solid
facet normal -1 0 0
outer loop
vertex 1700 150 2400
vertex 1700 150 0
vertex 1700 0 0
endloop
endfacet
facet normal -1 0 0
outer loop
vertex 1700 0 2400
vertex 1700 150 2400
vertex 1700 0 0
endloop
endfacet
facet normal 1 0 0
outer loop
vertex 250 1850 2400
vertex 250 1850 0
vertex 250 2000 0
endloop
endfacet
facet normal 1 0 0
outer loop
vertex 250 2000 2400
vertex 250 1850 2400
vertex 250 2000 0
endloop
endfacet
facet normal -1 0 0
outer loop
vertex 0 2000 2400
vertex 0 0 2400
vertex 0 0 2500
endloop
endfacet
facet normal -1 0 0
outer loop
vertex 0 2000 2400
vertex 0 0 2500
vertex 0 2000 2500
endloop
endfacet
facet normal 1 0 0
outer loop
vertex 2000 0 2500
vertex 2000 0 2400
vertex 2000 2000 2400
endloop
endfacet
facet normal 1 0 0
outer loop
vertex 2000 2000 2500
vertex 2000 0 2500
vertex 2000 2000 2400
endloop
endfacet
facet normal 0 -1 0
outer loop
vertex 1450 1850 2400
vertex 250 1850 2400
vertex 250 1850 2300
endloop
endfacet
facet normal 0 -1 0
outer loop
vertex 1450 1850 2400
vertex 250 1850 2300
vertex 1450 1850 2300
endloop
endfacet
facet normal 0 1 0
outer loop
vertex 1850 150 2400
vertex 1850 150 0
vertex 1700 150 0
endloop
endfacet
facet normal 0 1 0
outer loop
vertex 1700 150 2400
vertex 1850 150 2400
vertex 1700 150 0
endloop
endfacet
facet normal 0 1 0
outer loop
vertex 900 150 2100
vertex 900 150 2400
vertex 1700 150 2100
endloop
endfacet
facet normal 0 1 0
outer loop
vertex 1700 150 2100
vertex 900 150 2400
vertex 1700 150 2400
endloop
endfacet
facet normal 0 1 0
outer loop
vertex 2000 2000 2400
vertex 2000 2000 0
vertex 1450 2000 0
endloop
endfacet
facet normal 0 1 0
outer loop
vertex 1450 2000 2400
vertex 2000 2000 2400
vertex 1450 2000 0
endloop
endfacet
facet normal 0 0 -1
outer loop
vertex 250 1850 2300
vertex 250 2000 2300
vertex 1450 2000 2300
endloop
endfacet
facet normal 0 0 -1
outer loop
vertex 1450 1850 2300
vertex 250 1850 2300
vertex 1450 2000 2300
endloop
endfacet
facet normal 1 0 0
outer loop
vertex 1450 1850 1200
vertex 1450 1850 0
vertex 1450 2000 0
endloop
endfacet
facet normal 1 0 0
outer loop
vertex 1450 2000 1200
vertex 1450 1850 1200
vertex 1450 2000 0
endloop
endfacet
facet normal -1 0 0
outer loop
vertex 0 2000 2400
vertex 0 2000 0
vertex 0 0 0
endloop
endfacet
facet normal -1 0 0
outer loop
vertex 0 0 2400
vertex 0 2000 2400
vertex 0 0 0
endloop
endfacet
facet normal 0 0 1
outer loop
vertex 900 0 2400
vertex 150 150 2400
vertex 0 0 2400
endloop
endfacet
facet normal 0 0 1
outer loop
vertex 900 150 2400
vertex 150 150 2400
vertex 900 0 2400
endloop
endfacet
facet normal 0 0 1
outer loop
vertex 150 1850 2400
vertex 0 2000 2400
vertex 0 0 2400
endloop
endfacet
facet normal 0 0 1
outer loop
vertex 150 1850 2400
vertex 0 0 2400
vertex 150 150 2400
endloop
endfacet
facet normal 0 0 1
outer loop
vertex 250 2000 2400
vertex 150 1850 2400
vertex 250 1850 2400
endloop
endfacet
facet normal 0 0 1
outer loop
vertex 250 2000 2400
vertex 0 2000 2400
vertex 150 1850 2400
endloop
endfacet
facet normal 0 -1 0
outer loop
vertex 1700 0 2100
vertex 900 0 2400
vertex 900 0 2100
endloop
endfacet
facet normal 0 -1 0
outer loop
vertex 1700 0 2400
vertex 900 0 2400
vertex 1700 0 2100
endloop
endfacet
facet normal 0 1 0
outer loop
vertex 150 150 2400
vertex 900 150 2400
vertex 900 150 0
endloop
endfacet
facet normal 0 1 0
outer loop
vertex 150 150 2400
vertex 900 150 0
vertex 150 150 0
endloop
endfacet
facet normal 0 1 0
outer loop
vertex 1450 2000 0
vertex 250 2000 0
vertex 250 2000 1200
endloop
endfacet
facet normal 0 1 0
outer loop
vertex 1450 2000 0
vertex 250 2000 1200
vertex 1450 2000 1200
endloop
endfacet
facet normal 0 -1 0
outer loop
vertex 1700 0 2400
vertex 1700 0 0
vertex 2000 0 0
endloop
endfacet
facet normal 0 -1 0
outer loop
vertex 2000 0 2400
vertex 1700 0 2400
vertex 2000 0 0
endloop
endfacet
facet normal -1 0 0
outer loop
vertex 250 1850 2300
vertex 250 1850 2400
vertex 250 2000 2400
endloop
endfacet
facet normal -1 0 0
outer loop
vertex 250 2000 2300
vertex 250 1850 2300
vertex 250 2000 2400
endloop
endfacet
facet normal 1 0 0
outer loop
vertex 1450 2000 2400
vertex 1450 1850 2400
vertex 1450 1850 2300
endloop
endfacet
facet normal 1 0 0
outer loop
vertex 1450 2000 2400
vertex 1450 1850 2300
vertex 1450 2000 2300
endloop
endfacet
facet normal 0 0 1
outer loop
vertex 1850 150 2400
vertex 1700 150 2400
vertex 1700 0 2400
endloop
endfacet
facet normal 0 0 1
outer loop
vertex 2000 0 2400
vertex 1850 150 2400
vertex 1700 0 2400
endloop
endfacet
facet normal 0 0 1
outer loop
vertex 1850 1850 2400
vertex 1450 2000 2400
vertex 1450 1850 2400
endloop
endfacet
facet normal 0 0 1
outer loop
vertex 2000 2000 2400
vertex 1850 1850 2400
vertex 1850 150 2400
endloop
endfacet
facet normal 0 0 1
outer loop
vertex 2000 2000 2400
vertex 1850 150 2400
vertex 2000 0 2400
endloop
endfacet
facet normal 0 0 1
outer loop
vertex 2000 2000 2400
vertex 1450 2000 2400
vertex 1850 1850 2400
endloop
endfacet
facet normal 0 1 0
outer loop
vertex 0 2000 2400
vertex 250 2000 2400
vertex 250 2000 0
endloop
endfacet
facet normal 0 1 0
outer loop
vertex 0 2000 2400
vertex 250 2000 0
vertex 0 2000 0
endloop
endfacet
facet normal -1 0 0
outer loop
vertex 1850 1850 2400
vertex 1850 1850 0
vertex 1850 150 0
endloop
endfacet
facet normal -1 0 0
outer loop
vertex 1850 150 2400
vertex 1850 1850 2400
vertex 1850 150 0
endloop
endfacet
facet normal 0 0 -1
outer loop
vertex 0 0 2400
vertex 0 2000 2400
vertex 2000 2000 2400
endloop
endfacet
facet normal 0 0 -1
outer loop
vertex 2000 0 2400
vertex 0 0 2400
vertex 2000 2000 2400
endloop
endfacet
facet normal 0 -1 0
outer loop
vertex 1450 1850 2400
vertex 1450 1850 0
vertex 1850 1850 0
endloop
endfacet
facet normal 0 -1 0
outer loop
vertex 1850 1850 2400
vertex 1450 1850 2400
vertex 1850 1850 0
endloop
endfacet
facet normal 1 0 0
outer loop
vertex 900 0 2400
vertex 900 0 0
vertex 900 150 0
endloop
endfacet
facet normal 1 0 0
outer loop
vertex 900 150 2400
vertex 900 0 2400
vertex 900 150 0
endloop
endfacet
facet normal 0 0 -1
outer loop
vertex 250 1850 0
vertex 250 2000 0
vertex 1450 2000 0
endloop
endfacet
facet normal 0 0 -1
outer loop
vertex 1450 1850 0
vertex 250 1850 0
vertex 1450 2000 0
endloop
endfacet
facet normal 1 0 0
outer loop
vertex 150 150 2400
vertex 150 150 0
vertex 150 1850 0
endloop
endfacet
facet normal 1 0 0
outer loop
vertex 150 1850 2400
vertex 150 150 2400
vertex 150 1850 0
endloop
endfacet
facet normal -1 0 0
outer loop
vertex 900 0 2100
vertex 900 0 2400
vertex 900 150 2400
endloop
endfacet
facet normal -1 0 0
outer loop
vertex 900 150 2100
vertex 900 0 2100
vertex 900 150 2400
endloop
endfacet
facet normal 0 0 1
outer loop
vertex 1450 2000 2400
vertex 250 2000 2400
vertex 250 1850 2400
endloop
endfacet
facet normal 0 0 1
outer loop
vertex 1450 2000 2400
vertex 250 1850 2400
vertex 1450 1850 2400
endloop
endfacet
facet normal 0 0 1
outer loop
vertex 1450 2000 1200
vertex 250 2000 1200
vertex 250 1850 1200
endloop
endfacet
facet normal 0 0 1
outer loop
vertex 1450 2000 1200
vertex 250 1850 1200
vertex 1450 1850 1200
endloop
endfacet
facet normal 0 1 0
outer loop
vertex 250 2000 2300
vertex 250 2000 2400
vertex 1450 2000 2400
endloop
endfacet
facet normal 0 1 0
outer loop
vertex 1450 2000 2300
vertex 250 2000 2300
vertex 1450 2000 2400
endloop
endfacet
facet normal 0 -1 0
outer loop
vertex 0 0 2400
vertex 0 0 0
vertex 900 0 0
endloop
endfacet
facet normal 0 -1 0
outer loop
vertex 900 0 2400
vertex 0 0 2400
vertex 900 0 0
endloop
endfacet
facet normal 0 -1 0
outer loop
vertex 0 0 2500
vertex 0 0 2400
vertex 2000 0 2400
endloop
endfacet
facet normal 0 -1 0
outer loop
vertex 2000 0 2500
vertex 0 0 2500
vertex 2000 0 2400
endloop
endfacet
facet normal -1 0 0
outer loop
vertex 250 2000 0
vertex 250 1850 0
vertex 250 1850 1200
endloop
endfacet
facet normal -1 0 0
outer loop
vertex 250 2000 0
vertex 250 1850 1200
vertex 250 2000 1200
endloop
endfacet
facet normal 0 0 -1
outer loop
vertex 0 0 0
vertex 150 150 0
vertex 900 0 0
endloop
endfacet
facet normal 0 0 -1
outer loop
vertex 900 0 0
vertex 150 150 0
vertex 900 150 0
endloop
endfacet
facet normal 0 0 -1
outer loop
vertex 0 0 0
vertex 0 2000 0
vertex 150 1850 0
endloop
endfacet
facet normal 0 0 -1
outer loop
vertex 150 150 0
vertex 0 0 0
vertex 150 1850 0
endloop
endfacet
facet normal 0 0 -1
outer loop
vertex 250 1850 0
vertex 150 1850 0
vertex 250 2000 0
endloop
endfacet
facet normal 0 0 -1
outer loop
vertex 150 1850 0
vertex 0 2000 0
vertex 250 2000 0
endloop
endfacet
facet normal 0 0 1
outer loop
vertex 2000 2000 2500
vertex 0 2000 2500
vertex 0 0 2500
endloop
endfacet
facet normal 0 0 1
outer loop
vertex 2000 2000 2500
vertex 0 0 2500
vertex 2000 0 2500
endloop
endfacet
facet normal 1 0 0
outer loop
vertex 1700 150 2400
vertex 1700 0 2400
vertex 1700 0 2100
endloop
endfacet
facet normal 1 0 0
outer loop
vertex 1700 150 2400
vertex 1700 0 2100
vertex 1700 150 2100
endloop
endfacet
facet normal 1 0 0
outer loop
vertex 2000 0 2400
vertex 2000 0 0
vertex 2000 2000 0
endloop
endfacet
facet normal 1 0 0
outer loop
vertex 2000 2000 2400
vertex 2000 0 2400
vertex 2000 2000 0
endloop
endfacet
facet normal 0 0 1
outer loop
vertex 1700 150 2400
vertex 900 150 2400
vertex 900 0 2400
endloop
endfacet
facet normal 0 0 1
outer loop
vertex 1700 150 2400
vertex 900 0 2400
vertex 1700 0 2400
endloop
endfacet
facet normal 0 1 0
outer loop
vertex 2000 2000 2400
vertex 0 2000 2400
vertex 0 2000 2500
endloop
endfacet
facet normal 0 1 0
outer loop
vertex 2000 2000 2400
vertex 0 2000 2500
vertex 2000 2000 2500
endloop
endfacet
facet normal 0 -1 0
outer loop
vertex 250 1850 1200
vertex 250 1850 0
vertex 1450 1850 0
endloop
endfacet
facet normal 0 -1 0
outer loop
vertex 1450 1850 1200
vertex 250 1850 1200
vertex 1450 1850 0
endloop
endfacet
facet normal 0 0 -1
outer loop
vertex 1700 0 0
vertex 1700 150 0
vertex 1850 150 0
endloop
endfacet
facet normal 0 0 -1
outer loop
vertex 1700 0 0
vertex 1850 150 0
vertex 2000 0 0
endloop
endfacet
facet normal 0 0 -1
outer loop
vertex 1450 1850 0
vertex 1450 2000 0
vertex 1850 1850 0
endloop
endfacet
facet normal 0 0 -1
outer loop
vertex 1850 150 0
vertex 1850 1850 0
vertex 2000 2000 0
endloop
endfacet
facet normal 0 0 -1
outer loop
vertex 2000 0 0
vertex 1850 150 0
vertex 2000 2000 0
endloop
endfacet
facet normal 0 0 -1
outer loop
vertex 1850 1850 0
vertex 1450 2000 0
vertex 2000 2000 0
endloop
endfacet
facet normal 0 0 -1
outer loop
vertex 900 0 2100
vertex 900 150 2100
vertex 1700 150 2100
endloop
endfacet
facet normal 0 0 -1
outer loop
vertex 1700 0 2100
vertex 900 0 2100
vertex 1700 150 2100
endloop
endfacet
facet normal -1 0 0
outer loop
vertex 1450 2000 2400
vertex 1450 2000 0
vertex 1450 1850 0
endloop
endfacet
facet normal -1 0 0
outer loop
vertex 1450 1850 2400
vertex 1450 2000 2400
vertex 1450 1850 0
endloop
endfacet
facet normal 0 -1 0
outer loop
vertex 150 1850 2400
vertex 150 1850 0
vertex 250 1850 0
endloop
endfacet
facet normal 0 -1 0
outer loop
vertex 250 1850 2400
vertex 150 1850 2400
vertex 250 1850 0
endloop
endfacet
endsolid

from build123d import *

# Parameters (mm, degrees)
EXTRUSION_DEPTH    = 2400
EXTRUSION001_DEPTH = 2400
RECTANGLE005_W     = 800
RECTANGLE005_H     = 150
EXTRUSION002_DEPTH = 300
RECTANGLE003_W     = 1200
RECTANGLE003_H     = 150
EXTRUSION003_DEPTH = 1200
RECTANGLE006_W     = 1200
RECTANGLE006_H     = 150
EXTRUSION004_DEPTH = 100
RECTANGLE007_W     = 2000
RECTANGLE007_H     = 2000
EXTRUSION005_DEPTH = 100


with BuildPart() as extrusion:
    # DWire → Extrusion (new body)
    with BuildSketch(Plane.XY):
        Polygon((250, 2000), (0, 2000), (0, 0), (900, 0), (900, 150), (150, 150), (150, 1850), (250, 1850), align=None)
    extrude(amount=EXTRUSION_DEPTH)


with BuildPart() as extrusion001:
    # DWire001 → Extrusion001 (new body)
    with BuildSketch(Plane.XY):
        Polygon((1450, 2000), (1450, 1850), (1850, 1850), (1850, 150), (1700, 150), (1700, 0), (2000, 0), (2000, 2000), align=None)
    extrude(amount=EXTRUSION001_DEPTH)


with BuildPart() as extrusion002:
    # Rectangle005 → Extrusion002 (new body)
    with BuildSketch(Plane(origin=(900, 150, 2400), x_dir=(1, 0, 0), z_dir=(0, 0, 1))):
        with Locations((400, -75)):
            Rectangle(RECTANGLE005_W, RECTANGLE005_H)
    extrude(amount=-EXTRUSION002_DEPTH)


with BuildPart() as extrusion003:
    # Rectangle003 → Extrusion003 (new body)
    with BuildSketch(Plane(origin=(250, 2000, 0), x_dir=(1, 0, 0), z_dir=(0, 0, 1))):
        with Locations((600, -75)):
            Rectangle(RECTANGLE003_W, RECTANGLE003_H)
    extrude(amount=EXTRUSION003_DEPTH)


with BuildPart() as extrusion004:
    # Rectangle006 → Extrusion004 (new body)
    with BuildSketch(Plane(origin=(1450, 2000, 2400), x_dir=(1, 0, 0), z_dir=(0, 0, 1))):
        with Locations((-600, -75)):
            Rectangle(RECTANGLE006_W, RECTANGLE006_H)
    extrude(amount=-EXTRUSION004_DEPTH)


with BuildPart() as extrusion005:
    # Rectangle007 → Extrusion005 (new body)
    with BuildSketch(Plane.XY.offset(2400)):
        with Locations((1000, 1000)):
            Rectangle(RECTANGLE007_W, RECTANGLE007_H)
    extrude(amount=EXTRUSION005_DEPTH)


solid = Compound([extrusion.part, extrusion001.part, extrusion002.part, extrusion003.part, extrusion004.part, extrusion005.part])
